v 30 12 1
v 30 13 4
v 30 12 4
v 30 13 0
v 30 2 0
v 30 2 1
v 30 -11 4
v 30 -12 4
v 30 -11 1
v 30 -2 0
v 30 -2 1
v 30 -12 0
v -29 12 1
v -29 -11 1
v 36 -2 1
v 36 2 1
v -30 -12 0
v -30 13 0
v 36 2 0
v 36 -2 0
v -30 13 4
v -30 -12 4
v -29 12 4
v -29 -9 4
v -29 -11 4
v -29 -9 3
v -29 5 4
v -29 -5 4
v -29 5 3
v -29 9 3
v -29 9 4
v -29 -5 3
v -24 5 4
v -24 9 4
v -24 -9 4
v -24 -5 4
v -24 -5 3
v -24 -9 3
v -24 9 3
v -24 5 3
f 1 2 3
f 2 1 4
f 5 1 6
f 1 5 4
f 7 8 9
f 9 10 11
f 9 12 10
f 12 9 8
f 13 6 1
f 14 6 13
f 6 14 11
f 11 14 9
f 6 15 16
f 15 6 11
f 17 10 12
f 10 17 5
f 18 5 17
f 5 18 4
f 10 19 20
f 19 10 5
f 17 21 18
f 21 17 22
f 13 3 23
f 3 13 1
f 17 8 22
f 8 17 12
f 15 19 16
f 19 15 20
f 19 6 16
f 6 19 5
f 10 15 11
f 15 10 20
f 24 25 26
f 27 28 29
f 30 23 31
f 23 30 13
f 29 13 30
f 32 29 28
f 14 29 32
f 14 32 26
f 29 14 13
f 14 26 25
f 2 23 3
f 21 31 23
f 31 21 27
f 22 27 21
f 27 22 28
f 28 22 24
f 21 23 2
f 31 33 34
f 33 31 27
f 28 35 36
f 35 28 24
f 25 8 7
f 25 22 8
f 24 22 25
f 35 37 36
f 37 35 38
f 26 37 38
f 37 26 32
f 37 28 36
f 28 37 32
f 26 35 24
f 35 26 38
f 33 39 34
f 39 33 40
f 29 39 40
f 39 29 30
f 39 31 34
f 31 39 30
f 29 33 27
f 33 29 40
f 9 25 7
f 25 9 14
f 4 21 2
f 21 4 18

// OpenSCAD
// Build the bottom of the box

// Sizes

span = 60;
inside_width = 24;
height = 4;

module release() {
  cube([6,4,1]);
}

module clip() {
  cube([6,4,1]);
}

module bottom() {
  cube([60,24,1]);
  translate([60,10,0]) release();
}

module side() {
  cube([60,1,4]);
}

module end() {
  cube([1,24,4]);
  translate([0,3,3]) clip();
  translate([0,17,3]) clip();
}

union() {
  translate([-30,-12,0]) bottom();
  translate([-30,-12,0]) side();
  translate([-30,+12,0]) side();
  translate([-30,-12,0]) end();
}
